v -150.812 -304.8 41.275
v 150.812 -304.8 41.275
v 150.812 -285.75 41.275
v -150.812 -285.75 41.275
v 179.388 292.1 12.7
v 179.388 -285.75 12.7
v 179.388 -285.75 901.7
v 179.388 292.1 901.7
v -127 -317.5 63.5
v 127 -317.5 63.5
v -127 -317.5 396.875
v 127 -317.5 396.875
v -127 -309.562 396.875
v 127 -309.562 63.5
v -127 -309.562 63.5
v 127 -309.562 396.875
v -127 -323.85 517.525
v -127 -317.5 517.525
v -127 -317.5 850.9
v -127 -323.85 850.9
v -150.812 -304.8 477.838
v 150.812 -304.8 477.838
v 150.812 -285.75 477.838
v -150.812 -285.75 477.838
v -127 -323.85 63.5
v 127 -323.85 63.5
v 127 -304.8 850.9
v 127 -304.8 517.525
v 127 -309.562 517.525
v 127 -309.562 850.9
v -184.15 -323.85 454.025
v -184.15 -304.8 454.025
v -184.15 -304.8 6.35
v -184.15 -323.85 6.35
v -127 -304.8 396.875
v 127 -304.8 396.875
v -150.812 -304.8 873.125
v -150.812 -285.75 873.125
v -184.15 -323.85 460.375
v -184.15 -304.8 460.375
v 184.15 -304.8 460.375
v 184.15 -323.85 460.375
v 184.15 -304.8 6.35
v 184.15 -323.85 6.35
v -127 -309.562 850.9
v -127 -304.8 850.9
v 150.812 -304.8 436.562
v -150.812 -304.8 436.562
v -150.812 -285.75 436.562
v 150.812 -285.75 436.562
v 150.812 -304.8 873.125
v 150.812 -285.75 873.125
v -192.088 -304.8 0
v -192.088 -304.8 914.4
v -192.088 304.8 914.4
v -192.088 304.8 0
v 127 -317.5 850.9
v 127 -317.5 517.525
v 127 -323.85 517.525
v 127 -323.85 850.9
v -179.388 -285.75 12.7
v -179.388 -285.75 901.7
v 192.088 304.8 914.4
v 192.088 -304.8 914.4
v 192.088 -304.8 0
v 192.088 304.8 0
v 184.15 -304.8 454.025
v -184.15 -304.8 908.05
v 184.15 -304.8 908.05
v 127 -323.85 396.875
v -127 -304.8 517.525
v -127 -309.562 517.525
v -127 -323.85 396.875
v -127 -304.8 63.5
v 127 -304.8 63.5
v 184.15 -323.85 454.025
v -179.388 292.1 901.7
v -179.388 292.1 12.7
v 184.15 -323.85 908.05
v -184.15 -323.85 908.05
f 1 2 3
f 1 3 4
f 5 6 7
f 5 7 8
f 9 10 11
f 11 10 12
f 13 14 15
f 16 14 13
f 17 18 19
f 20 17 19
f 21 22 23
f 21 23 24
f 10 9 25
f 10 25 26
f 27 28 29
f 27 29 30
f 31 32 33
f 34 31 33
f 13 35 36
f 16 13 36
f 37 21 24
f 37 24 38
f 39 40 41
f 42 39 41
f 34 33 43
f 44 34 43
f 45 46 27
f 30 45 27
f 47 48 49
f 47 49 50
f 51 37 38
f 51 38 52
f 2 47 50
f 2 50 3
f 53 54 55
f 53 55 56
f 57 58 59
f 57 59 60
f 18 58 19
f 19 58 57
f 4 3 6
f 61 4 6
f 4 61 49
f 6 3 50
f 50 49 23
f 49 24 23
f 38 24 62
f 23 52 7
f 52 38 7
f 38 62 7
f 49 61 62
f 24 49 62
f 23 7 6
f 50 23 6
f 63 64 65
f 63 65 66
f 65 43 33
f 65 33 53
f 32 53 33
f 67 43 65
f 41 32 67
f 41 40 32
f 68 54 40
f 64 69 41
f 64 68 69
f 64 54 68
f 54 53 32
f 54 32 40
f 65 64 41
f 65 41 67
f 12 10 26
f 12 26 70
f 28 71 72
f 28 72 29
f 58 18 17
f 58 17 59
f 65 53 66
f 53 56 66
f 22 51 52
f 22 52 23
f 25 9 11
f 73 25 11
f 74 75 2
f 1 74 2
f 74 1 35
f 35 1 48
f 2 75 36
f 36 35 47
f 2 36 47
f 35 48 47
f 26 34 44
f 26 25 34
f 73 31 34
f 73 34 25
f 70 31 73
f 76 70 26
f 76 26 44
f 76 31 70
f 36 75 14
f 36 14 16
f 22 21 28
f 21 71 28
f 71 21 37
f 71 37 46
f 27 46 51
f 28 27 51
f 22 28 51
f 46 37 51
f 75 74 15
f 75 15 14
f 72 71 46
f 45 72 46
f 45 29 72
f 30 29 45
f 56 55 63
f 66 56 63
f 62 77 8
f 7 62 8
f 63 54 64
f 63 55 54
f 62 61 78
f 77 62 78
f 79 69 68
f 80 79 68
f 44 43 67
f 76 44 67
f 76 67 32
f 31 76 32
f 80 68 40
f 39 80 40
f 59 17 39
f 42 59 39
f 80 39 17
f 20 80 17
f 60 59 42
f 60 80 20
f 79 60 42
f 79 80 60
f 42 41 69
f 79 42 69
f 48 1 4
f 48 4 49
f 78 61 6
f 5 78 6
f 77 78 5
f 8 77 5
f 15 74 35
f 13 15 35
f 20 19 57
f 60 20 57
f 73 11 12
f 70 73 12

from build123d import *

# Parameters (mm, degrees)
F0_W     = 384.175
F0_H     = 609.6
F1_DEPTH = 914.4
F2_T     = -12.7
F3_W     = 28.575
F3_H     = 17.4625
F3_W_2   = 301.625
F3_W_3   = 4.7625
F3_H_2   = 6.35
F4_DEPTH = 19.05
F5_DEPTH = 19.05
F3_H_3   = 395.2875
F3_W_4   = 254
F3_H_4   = 333.375
F6_DEPTH = 19.05
F7_W     = 7.9375
F7_H     = 333.375
F8_DEPTH = 254


with BuildPart() as f1:
    # F0 (on Top) → F1 (new body)
    with BuildSketch(Plane.XY):
        Rectangle(F0_W, F0_H)
    extrude(amount=F1_DEPTH)

    # F2
    f2_openings = [f1.faces().sort_by_distance(p)[0] for p in [
        (0, -304.8, 457.2),
    ]]
    offset(amount=F2_T, openings=f2_openings)

    # F3 (on face) → F4 (join)
    with BuildSketch(Plane.XZ.offset(304.8)):
        Polygon((-192.0875, 477.8375), (-192.0875, 436.5625), (-184.15, 436.5625), (-184.15, 454.025), (-179.3875, 454.025), (-179.3875, 460.375), (-184.15, 460.375), (-184.15, 477.8375), align=None)
        with Locations((-165.1, 445.29375)):
            Rectangle(F3_W, F3_H)
        with Locations((-165.1, 469.10625)):
            Rectangle(F3_W, F3_H)
        with Locations((0, 445.29375)):
            Rectangle(F3_W_2, F3_H)
        with Locations((0, 469.10625)):
            Rectangle(F3_W_2, F3_H)
        with Locations((165.1, 445.29375)):
            Rectangle(F3_W, F3_H)
        with Locations((165.1, 469.10625)):
            Rectangle(F3_W, F3_H)
        Polygon((184.15, 436.5625), (192.0875, 436.5625), (192.0875, 477.8375), (184.15, 477.8375), (184.15, 460.375), (179.3875, 460.375), (179.3875, 454.025), (184.15, 454.025), align=None)
        with Locations((181.76875, 445.29375)):
            Rectangle(F3_W_3, F3_H)
        with Locations((181.76875, 469.10625)):
            Rectangle(F3_W_3, F3_H)
        with Locations((165.1, 457.2)):
            Rectangle(F3_W, F3_H_2)
        with Locations((-165.1, 457.2)):
            Rectangle(F3_W, F3_H_2)
        with Locations((-181.76875, 445.29375)):
            Rectangle(F3_W_3, F3_H)
        with Locations((-181.76875, 469.10625)):
            Rectangle(F3_W_3, F3_H)
        with Locations((0, 457.2)):
            Rectangle(F3_W_2, F3_H_2)
    extrude(amount=-F4_DEPTH)

    # F3 (on face) → F5 (join)
    with BuildSketch(Plane.XZ.offset(304.8)):
        Polygon((-179.3875, 901.7), (-179.3875, 477.8375), (-150.8125, 477.8375), (-150.8125, 873.125), (150.8125, 873.125), (150.8125, 477.8375), (179.3875, 477.8375), (179.3875, 901.7), align=None)
        Polygon((-192.0875, 914.4), (-192.0875, 477.8375), (-184.15, 477.8375), (-184.15, 908.05), (184.15, 908.05), (184.15, 477.8375), (192.0875, 477.8375), (192.0875, 914.4), align=None)
        Polygon((-150.8125, 436.5625), (-179.3875, 436.5625), (-179.3875, 12.7), (179.3875, 12.7), (179.3875, 436.5625), (150.8125, 436.5625), (150.8125, 41.275), (-150.8125, 41.275), align=None)
        Polygon((-184.15, 436.5625), (-192.0875, 436.5625), (-192.0875, 0), (192.0875, 0), (192.0875, 436.5625), (184.15, 436.5625), (184.15, 6.35), (-184.15, 6.35), align=None)
        Polygon((-179.3875, 436.5625), (-184.15, 436.5625), (-184.15, 6.35), (184.15, 6.35), (184.15, 436.5625), (179.3875, 436.5625), (179.3875, 12.7), (-179.3875, 12.7), align=None)
        with Locations((-165.1, 445.29375)):
            Rectangle(F3_W, F3_H)
        Polygon((-192.0875, 477.8375), (-192.0875, 436.5625), (-184.15, 436.5625), (-184.15, 454.025), (-179.3875, 454.025), (-179.3875, 460.375), (-184.15, 460.375), (-184.15, 477.8375), align=None)
        with Locations((-181.76875, 445.29375)):
            Rectangle(F3_W_3, F3_H)
        with Locations((-165.1, 469.10625)):
            Rectangle(F3_W, F3_H)
        with Locations((165.1, 469.10625)):
            Rectangle(F3_W, F3_H)
        with Locations((165.1, 445.29375)):
            Rectangle(F3_W, F3_H)
        Polygon((184.15, 436.5625), (192.0875, 436.5625), (192.0875, 477.8375), (184.15, 477.8375), (184.15, 460.375), (179.3875, 460.375), (179.3875, 454.025), (184.15, 454.025), align=None)
        with Locations((181.76875, 445.29375)):
            Rectangle(F3_W_3, F3_H)
    extrude(amount=-F5_DEPTH)

    # F3 (on face) → F6 (join)
    with BuildSketch(Plane.XZ.offset(304.8)):
        Polygon((-150.8125, 436.5625), (-179.3875, 436.5625), (-179.3875, 12.7), (179.3875, 12.7), (179.3875, 436.5625), (150.8125, 436.5625), (150.8125, 41.275), (-150.8125, 41.275), align=None)
        Polygon((-179.3875, 436.5625), (-184.15, 436.5625), (-184.15, 6.35), (184.15, 6.35), (184.15, 436.5625), (179.3875, 436.5625), (179.3875, 12.7), (-179.3875, 12.7), align=None)
        with Locations((0, 238.91875)):
            Rectangle(F3_W_2, F3_H_3)
        with Locations((0, 230.1875)):
            Rectangle(F3_W_4, F3_H_4, mode=Mode.SUBTRACT)
        with Locations((0, 445.29375)):
            Rectangle(F3_W_2, F3_H)
        with Locations((-165.1, 445.29375)):
            Rectangle(F3_W, F3_H)
        with Locations((165.1, 445.29375)):
            Rectangle(F3_W, F3_H)
        with Locations((181.76875, 445.29375)):
            Rectangle(F3_W_3, F3_H)
        with Locations((-181.76875, 445.29375)):
            Rectangle(F3_W_3, F3_H)
        Polygon((-179.3875, 901.7), (-179.3875, 477.8375), (-150.8125, 477.8375), (-150.8125, 873.125), (150.8125, 873.125), (150.8125, 477.8375), (179.3875, 477.8375), (179.3875, 901.7), align=None)
        with Locations((0, 675.48125)):
            Rectangle(F3_W_2, F3_H_3)
        with Locations((0, 684.2125)):
            Rectangle(F3_W_4, F3_H_4, mode=Mode.SUBTRACT)
        with Locations((-165.1, 469.10625)):
            Rectangle(F3_W, F3_H)
        with Locations((0, 469.10625)):
            Rectangle(F3_W_2, F3_H)
        with Locations((165.1, 469.10625)):
            Rectangle(F3_W, F3_H)
        with Locations((181.76875, 469.10625)):
            Rectangle(F3_W_3, F3_H)
        Polygon((-184.15, 908.05), (-184.15, 477.8375), (-179.3875, 477.8375), (-179.3875, 901.7), (179.3875, 901.7), (179.3875, 477.8375), (184.15, 477.8375), (184.15, 908.05), align=None)
        with Locations((-181.76875, 469.10625)):
            Rectangle(F3_W_3, F3_H)
    extrude(amount=F6_DEPTH)

    # F7 (on face) → F8 (join, through all)
    with BuildSketch(Plane(origin=(127, 0, 0), x_dir=(0, -1, 0), z_dir=(-1, 0, 0))):
        with Locations((313.53125, 230.1875)):
            Rectangle(F7_W, F7_H)
        with Locations((313.53125, 684.2125)):
            Rectangle(F7_W, F7_H)
    extrude(amount=F8_DEPTH)


solid = f1.part
